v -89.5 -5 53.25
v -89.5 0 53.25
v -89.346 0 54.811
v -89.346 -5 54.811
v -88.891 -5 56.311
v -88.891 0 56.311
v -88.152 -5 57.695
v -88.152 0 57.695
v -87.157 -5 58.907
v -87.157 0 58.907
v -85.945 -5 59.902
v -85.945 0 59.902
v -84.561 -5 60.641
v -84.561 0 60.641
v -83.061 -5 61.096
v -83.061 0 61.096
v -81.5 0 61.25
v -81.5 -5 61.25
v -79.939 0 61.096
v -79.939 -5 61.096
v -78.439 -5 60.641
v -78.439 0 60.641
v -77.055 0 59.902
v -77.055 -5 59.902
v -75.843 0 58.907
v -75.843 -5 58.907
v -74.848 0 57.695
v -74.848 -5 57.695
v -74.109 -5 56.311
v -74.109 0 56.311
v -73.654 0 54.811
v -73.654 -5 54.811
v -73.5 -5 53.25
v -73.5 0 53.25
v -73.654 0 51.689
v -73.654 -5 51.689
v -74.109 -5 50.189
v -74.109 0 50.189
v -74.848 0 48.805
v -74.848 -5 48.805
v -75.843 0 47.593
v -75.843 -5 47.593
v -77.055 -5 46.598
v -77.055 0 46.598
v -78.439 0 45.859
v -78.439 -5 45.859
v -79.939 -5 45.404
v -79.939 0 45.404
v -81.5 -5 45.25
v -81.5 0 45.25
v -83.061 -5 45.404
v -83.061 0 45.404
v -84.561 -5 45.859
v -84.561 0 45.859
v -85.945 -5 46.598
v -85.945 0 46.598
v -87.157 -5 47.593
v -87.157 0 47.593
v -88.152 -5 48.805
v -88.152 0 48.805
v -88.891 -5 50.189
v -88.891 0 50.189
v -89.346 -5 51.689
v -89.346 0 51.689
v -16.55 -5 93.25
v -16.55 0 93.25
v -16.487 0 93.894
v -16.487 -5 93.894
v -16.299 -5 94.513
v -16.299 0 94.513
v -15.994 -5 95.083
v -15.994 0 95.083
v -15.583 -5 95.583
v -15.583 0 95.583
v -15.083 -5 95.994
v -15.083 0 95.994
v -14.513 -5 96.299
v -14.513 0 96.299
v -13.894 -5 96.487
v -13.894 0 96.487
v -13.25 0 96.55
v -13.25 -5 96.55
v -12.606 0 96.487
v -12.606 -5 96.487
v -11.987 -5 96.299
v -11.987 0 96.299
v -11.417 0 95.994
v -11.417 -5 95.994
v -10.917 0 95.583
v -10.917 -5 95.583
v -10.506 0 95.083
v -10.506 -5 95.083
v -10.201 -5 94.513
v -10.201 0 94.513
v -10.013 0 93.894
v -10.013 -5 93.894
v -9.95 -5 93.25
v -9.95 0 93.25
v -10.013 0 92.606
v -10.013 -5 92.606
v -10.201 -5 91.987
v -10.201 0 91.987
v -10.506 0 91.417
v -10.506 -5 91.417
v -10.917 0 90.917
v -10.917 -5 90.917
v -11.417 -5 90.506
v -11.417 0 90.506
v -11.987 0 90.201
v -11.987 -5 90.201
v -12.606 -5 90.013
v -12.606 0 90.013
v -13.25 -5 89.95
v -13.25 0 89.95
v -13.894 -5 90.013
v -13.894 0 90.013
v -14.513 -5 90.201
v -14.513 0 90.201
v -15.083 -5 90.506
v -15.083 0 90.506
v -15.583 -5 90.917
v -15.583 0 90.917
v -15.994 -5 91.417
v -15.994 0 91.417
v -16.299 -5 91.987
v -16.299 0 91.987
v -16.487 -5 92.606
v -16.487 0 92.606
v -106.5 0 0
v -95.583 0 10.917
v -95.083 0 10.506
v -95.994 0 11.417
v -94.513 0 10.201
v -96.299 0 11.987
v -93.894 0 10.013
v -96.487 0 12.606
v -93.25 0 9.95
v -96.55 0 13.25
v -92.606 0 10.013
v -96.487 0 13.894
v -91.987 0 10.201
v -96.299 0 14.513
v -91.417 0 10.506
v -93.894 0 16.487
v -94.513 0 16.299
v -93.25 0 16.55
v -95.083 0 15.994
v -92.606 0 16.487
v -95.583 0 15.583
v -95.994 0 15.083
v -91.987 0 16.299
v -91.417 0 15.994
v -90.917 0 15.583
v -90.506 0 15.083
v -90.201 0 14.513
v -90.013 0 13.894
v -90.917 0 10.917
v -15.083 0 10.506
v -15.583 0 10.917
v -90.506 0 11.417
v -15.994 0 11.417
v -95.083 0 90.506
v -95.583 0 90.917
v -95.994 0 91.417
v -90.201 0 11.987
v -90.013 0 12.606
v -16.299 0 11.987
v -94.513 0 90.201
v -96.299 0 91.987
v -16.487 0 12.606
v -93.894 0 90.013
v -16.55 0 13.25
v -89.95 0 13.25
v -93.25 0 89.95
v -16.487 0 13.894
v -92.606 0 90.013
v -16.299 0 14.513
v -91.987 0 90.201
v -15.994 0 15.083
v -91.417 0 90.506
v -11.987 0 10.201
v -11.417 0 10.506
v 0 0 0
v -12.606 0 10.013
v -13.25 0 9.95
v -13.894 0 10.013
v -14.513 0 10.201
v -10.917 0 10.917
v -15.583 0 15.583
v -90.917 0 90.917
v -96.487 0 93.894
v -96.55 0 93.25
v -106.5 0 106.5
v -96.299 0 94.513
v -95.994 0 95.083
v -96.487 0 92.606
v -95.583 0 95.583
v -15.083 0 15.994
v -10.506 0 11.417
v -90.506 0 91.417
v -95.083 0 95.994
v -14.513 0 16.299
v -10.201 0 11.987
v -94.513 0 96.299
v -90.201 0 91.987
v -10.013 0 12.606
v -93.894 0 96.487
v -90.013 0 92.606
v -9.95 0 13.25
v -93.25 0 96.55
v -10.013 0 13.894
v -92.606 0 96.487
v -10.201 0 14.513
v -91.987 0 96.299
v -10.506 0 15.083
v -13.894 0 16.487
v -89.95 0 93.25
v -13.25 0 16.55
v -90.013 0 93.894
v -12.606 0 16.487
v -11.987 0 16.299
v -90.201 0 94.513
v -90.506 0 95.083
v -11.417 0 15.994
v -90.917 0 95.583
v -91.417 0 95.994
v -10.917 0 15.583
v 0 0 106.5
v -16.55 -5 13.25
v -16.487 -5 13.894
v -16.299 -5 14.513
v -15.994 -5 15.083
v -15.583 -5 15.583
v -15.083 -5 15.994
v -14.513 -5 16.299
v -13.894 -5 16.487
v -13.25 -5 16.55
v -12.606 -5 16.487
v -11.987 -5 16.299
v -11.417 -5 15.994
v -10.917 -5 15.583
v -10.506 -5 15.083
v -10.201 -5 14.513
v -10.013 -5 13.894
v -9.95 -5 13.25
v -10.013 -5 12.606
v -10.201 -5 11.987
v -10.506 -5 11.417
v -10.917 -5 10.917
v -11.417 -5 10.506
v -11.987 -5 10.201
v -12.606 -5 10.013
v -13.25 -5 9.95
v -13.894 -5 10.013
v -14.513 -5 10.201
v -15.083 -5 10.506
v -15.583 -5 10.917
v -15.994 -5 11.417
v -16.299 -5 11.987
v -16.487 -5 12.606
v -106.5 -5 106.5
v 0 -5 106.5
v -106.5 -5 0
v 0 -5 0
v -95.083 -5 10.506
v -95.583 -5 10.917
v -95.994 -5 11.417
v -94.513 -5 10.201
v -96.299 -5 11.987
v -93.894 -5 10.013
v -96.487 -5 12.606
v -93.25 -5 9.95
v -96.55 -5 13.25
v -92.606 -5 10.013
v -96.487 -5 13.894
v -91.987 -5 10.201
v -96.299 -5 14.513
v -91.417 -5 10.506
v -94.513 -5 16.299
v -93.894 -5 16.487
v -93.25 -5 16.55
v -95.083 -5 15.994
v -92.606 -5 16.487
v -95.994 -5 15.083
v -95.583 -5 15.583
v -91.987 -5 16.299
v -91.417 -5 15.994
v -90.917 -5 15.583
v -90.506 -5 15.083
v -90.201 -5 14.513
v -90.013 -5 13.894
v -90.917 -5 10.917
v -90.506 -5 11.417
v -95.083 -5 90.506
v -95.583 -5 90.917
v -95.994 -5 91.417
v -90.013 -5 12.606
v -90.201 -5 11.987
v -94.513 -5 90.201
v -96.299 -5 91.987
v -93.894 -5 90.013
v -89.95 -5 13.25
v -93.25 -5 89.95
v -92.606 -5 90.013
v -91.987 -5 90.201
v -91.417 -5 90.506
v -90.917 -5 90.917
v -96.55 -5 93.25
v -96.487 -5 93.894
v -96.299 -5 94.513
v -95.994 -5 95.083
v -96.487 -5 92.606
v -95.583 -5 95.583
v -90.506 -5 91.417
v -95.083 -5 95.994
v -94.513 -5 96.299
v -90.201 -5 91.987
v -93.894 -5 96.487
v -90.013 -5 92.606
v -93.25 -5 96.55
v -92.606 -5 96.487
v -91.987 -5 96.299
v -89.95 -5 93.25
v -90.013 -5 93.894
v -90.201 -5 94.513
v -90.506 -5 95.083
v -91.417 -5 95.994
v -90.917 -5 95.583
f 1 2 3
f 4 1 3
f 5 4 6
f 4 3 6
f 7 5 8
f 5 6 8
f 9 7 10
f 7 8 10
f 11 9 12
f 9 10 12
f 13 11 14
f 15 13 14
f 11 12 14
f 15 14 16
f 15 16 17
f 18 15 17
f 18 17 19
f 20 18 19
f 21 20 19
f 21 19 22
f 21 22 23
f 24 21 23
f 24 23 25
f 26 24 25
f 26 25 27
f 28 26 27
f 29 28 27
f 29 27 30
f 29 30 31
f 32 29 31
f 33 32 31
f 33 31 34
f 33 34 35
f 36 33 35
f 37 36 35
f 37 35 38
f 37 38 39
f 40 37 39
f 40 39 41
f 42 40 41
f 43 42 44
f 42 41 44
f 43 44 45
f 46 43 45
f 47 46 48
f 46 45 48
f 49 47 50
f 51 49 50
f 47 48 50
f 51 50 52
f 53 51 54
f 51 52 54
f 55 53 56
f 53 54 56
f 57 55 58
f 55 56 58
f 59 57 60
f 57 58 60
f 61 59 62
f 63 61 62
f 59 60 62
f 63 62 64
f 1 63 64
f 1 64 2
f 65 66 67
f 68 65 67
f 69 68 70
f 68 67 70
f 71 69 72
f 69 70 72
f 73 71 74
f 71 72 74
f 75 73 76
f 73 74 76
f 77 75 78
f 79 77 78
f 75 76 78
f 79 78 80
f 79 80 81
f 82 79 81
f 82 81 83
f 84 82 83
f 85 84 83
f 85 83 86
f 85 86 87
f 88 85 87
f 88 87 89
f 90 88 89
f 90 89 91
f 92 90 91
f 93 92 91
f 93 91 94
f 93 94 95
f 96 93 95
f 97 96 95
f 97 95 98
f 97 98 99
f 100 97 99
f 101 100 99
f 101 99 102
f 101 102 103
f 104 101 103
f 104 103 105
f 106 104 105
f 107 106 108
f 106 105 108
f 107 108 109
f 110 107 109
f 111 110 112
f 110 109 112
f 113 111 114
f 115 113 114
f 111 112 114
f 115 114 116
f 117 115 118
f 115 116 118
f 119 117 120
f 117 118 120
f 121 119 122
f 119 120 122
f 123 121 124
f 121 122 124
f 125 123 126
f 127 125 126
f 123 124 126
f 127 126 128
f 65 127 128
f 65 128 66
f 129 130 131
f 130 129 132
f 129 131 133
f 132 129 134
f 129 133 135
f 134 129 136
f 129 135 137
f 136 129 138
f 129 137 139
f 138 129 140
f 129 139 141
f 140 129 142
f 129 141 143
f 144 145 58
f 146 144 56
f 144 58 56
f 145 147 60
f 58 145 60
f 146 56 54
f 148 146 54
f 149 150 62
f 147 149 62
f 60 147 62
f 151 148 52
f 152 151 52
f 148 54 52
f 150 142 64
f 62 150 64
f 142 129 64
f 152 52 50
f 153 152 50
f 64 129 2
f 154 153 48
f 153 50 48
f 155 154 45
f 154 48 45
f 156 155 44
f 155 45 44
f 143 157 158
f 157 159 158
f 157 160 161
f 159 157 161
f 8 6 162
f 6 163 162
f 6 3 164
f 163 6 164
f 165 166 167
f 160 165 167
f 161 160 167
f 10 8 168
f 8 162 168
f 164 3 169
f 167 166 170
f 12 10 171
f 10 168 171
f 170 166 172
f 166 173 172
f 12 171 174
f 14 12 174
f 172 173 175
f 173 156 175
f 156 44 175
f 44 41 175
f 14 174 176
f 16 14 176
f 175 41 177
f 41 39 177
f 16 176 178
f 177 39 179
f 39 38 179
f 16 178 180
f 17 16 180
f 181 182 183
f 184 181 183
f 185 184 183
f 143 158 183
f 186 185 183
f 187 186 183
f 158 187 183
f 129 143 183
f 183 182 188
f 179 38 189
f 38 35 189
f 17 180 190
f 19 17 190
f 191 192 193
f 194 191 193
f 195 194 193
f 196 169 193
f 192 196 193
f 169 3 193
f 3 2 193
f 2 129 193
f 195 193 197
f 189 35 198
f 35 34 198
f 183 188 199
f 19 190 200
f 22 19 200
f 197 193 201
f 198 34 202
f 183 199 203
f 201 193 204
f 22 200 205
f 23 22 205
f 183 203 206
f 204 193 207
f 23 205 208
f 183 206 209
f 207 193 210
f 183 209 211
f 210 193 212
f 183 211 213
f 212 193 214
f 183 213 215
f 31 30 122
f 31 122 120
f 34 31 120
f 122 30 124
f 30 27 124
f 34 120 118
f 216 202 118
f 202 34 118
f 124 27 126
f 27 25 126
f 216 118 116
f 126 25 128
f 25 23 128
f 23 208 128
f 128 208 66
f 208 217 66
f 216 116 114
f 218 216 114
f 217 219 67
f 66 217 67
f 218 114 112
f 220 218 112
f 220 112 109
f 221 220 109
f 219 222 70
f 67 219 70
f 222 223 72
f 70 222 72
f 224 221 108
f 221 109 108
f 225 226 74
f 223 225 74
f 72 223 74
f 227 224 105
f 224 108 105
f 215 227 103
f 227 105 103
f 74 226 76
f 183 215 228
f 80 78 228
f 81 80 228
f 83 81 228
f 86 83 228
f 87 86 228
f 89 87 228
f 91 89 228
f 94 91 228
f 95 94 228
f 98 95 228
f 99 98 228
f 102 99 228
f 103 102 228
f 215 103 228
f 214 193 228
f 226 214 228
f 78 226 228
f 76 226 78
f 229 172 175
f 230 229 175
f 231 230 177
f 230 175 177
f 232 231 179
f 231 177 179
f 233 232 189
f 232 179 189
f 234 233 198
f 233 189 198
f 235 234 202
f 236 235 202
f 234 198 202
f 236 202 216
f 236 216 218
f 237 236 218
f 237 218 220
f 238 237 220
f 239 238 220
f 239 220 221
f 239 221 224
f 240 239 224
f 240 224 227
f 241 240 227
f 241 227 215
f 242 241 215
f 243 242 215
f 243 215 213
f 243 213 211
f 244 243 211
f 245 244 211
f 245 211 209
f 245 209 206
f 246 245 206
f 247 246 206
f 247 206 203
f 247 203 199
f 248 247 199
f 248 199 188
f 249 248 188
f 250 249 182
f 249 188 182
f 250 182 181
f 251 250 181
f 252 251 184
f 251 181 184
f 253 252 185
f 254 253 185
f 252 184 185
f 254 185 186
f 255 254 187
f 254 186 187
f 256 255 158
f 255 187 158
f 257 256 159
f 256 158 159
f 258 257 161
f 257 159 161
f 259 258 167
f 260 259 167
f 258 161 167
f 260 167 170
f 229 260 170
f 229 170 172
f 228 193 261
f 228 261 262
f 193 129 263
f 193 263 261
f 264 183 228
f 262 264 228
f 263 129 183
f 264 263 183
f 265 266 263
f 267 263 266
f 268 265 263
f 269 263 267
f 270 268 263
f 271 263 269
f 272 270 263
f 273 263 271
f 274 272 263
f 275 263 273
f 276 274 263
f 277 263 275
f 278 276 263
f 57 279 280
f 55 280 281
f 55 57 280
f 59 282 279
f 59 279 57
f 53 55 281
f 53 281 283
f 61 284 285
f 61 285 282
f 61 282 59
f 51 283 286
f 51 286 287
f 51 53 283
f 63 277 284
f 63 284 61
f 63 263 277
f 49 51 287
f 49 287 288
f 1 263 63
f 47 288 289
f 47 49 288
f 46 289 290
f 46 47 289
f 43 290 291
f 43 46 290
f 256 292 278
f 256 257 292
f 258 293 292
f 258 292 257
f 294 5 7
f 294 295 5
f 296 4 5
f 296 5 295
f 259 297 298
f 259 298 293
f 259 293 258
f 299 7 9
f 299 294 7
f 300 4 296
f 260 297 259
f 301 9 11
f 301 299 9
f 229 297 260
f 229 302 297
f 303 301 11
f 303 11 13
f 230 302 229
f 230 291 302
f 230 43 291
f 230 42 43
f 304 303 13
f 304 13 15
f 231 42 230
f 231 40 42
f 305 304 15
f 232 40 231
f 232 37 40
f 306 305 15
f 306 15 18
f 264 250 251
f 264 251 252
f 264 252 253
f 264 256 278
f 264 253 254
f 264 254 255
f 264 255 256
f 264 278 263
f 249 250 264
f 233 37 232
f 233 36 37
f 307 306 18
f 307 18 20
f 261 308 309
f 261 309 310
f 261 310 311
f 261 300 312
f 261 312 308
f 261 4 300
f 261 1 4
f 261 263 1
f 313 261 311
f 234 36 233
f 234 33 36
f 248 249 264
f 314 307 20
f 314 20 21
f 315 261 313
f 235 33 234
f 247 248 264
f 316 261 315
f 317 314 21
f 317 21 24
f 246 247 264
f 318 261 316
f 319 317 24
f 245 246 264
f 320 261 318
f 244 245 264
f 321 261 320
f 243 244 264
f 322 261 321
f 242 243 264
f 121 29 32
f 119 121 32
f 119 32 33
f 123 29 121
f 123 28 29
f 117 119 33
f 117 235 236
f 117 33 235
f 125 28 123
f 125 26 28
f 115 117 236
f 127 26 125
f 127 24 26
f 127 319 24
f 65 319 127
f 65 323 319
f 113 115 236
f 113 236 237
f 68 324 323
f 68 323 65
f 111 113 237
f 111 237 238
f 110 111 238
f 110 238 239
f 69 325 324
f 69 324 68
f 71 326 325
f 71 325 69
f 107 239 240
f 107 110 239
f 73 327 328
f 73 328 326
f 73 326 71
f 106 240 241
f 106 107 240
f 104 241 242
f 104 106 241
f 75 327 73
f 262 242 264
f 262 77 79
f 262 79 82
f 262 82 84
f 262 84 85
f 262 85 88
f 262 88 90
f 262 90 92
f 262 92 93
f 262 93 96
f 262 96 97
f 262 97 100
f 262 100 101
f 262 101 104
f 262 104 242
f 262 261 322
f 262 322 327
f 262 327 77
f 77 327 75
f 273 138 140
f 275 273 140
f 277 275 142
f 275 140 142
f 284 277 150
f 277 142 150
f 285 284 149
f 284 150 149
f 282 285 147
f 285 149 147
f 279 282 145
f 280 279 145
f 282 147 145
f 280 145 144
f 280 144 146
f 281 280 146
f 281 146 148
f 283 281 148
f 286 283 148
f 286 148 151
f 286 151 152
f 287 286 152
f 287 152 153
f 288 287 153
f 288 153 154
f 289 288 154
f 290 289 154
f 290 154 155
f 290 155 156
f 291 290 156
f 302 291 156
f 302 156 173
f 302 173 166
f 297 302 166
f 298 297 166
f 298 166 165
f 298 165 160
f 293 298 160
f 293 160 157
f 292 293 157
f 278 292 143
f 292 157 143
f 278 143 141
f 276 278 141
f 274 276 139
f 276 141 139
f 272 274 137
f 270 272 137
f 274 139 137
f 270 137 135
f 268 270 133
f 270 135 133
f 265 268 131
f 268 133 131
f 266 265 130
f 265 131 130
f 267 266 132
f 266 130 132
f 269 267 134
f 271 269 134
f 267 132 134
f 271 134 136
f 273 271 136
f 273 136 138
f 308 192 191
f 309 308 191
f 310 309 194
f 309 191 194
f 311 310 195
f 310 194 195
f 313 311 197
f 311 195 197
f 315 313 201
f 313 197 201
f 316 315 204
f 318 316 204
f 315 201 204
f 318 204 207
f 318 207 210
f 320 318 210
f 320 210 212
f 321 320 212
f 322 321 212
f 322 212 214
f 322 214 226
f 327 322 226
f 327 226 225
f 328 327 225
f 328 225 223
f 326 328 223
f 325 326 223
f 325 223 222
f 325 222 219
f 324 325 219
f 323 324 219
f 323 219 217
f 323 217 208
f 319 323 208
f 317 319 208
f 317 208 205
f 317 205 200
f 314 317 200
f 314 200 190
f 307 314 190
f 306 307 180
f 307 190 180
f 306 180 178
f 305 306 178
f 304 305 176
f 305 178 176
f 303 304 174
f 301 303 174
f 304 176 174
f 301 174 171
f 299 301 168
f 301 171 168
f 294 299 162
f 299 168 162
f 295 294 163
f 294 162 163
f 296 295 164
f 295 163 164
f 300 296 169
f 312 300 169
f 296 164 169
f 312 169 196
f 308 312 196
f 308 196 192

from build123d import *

# Parameters (mm, degrees)
F0_W     = 106.5
F0_H     = 106.5
F1_DEPTH = 5
F3_D     = 6.6
F5_D     = 16


with BuildPart() as f1:
    # F0 (on Front) → F1 (new body)
    with BuildSketch(Plane.XZ):
        with Locations((-53.25, 53.25)):
            Rectangle(F0_W, F0_H)
    extrude(amount=F1_DEPTH)

    # F3 (through all)
    with Locations(Plane.XZ.offset(5)):
        with Locations((-93.25, 93.25), (-93.25, 13.25), (-13.25, 13.25), (-13.25, 93.25)):
            Hole(F3_D / 2)

    # F5 (through all)
    with Locations(Plane.XZ.offset(5)):
        with Locations((-81.5, 53.25)):
            Hole(F5_D / 2)


solid = f1.part
